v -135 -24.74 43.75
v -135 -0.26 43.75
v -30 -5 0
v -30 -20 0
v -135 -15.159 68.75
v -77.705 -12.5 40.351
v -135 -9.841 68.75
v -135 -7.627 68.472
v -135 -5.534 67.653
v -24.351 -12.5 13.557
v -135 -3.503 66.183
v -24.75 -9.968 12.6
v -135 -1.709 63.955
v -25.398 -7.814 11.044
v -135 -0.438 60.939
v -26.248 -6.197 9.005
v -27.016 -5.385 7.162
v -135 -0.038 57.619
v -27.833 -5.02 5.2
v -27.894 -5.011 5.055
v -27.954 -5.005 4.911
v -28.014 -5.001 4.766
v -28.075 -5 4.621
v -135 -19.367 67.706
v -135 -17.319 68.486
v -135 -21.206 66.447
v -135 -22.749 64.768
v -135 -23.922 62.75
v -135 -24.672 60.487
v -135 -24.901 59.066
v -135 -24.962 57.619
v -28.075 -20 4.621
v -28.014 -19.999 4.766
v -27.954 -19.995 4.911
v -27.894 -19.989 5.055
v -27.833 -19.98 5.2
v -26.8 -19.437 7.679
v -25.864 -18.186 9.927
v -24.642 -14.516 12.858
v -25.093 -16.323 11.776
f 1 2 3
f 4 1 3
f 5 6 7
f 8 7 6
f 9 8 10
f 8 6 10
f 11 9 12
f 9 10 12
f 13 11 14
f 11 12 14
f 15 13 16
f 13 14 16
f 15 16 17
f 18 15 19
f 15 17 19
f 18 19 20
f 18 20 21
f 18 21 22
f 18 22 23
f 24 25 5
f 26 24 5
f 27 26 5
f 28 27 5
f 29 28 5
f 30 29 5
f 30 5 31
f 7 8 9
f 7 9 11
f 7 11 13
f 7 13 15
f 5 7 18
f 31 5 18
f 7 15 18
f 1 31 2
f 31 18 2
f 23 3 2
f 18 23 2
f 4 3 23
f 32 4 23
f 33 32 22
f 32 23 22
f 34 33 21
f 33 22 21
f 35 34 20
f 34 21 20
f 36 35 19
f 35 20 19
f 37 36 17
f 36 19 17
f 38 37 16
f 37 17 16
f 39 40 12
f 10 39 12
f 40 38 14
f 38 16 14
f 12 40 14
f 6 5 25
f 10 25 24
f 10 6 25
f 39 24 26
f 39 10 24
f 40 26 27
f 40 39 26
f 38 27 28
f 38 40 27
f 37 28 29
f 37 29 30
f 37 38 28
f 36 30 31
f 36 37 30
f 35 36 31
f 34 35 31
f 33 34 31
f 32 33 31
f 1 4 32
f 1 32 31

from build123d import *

# Parameters (mm, degrees)
F1_DEPTH     = 25
F2_T1_DEPTH  = 638.9799936737
F3_T1_DEPTH  = 170.2250104198
F3_T3_DEPTH  = 170.2250104198
F3_T8_DEPTH  = 61.8334709535
F3_S9_R      = 10
F3_T10_DEPTH = 33
F3_T14_DEPTH = 61.8334709535
F3_S15_R     = 10
F3_T16_DEPTH = 33


# Not quite as in the source:
# - a fillet or chamfer that OpenCascade refuses, or shapes differently, is made with other operations: its cross-section is extruded or revolved along the edge and cut away or added


with BuildPart() as f1:
    # F0 (on Front) → F1 (new body)
    with BuildSketch(Plane.XZ):
        Polygon((-135, 68.75), (-135, 43.75), (-30, 0), (-24.2307692308, 13.8461538462), align=None)
    extrude(amount=F1_DEPTH)

    # F2: chamfer of 5 x 120 on 2 edges, made by hand

    # F2_s2 → F2_t1 (cut)
    with BuildSketch(Plane(origin=(-124.434022452, 0, -298.6416538849), x_dir=(0, 1, 0), z_dir=(0.3846153846, 0, 0.9230769231))):
        Polygon((-5, 27.6923076923), (0, 147.6923076923), (0, 27.6923076923), align=None)
        Polygon((-20, 27.6923076923), (-25, 147.6923076923), (-25, 27.6923076923), align=None)
    extrude(amount=F2_T1_DEPTH, mode=Mode.SUBTRACT)

    # F3: fillet of radius 10 on 3 edges, made by hand

    # F3_s2 → F3_t1 (cut)
    with BuildSketch(Plane(origin=(-3.3426758621, -0.1551162157, 1.6568297893), x_dir=(0.0463549196, -0.9989250329, 0), z_dir=(-0.8952038609, -0.041541759, 0.443716497))):
        with BuildLine():
            ThreePointArc((8.8845597759, 1.4623687793), (15.8844108663, -1.6017037775), (18.6771013822, -8.7141812364))
            Line((18.6771013822, -8.7141812364), (18.8552852991, 1.2570657903))
            Line((18.8552852991, 1.2570657903), (8.8845597759, 1.4623687793))
        make_face()
    extrude(amount=F3_T1_DEPTH, mode=Mode.SUBTRACT)

    # F3_s4 → F3_t3 (cut)
    with BuildSketch(Plane(origin=(-2.4129672855, 0.1119732721, 1.1960106944), x_dir=(-0.0463549196, -0.9989250329, 0), z_dir=(-0.8952038609, 0.041541759, 0.443716497))):
        with BuildLine():
            ThreePointArc((16.0885660475, 1.976579843), (9.0887149571, -1.0874927139), (6.2960244412, -8.1999701727))
            Line((6.2960244412, -8.1999701727), (6.1178405244, 1.7712768539))
            Line((6.1178405244, 1.7712768539), (16.0885660475, 1.976579843))
        make_face()
    extrude(amount=F3_T3_DEPTH, mode=Mode.SUBTRACT)


with BuildPart() as f3_tool6:
    # F3_s7 → F3_t8 (new body)
    with BuildSketch(Plane.XZ.offset(-18.4167354767)):
        with BuildLine():
            ThreePointArc((-32.6231145704, 18.005901406), (-27.6978305819, 12.5493770531), (-27.8333439195, 5.1999745932))
            Line((-27.8333439195, 5.1999745932), (-24.2307692308, 13.8461538462))
            Line((-24.2307692308, 13.8461538462), (-32.6231145704, 18.005901406))
        make_face()
    extrude(amount=F3_T8_DEPTH)

    # F3_s9 → F3_t10 (cut, symmetric)
    with BuildSketch(Plane(origin=(-27.8408400733, -1.2919487057, 13.7995830572), x_dir=(-0.0463549196, 0.9989250329, 0), z_dir=(0.8952038609, 0.041541759, -0.443716497))):
        with Locations((-8.6786976438, -8.5355120353)):
            Circle(F3_S9_R)
    extrude(amount=F3_T10_DEPTH, both=True, mode=Mode.SUBTRACT)


with BuildPart() as f1_1:
    add(f1.part)

    # F3_t5: cut F3_tool6
    add(f3_tool6.part, mode=Mode.SUBTRACT)


with BuildPart() as f3_tool12:
    # F3_s13 → F3_t14 (new body)
    with BuildSketch(Plane.XZ.offset(-18.4167354767)):
        with BuildLine():
            ThreePointArc((-32.6231145704, 18.005901406), (-27.6978305819, 12.5493770531), (-27.8333439195, 5.1999745932))
            Line((-27.8333439195, 5.1999745932), (-24.2307692308, 13.8461538462))
            Line((-24.2307692308, 13.8461538462), (-32.6231145704, 18.005901406))
        make_face()
    extrude(amount=F3_T14_DEPTH)

    # F3_s15 → F3_t16 (cut, symmetric)
    with BuildSketch(Plane(origin=(-26.9456362125, 1.2504069466, 13.3558665602), x_dir=(0.0463549196, 0.9989250329, 0), z_dir=(0.8952038609, -0.041541759, -0.443716497))):
        with Locations((-16.2944281796, -8.0213009716)):
            Circle(F3_S15_R)
    extrude(amount=F3_T16_DEPTH, both=True, mode=Mode.SUBTRACT)


with BuildPart() as f1_2:
    add(f1_1.part)

    # F3_t11: cut F3_tool12
    add(f3_tool12.part, mode=Mode.SUBTRACT)


solid = f1_2.part
